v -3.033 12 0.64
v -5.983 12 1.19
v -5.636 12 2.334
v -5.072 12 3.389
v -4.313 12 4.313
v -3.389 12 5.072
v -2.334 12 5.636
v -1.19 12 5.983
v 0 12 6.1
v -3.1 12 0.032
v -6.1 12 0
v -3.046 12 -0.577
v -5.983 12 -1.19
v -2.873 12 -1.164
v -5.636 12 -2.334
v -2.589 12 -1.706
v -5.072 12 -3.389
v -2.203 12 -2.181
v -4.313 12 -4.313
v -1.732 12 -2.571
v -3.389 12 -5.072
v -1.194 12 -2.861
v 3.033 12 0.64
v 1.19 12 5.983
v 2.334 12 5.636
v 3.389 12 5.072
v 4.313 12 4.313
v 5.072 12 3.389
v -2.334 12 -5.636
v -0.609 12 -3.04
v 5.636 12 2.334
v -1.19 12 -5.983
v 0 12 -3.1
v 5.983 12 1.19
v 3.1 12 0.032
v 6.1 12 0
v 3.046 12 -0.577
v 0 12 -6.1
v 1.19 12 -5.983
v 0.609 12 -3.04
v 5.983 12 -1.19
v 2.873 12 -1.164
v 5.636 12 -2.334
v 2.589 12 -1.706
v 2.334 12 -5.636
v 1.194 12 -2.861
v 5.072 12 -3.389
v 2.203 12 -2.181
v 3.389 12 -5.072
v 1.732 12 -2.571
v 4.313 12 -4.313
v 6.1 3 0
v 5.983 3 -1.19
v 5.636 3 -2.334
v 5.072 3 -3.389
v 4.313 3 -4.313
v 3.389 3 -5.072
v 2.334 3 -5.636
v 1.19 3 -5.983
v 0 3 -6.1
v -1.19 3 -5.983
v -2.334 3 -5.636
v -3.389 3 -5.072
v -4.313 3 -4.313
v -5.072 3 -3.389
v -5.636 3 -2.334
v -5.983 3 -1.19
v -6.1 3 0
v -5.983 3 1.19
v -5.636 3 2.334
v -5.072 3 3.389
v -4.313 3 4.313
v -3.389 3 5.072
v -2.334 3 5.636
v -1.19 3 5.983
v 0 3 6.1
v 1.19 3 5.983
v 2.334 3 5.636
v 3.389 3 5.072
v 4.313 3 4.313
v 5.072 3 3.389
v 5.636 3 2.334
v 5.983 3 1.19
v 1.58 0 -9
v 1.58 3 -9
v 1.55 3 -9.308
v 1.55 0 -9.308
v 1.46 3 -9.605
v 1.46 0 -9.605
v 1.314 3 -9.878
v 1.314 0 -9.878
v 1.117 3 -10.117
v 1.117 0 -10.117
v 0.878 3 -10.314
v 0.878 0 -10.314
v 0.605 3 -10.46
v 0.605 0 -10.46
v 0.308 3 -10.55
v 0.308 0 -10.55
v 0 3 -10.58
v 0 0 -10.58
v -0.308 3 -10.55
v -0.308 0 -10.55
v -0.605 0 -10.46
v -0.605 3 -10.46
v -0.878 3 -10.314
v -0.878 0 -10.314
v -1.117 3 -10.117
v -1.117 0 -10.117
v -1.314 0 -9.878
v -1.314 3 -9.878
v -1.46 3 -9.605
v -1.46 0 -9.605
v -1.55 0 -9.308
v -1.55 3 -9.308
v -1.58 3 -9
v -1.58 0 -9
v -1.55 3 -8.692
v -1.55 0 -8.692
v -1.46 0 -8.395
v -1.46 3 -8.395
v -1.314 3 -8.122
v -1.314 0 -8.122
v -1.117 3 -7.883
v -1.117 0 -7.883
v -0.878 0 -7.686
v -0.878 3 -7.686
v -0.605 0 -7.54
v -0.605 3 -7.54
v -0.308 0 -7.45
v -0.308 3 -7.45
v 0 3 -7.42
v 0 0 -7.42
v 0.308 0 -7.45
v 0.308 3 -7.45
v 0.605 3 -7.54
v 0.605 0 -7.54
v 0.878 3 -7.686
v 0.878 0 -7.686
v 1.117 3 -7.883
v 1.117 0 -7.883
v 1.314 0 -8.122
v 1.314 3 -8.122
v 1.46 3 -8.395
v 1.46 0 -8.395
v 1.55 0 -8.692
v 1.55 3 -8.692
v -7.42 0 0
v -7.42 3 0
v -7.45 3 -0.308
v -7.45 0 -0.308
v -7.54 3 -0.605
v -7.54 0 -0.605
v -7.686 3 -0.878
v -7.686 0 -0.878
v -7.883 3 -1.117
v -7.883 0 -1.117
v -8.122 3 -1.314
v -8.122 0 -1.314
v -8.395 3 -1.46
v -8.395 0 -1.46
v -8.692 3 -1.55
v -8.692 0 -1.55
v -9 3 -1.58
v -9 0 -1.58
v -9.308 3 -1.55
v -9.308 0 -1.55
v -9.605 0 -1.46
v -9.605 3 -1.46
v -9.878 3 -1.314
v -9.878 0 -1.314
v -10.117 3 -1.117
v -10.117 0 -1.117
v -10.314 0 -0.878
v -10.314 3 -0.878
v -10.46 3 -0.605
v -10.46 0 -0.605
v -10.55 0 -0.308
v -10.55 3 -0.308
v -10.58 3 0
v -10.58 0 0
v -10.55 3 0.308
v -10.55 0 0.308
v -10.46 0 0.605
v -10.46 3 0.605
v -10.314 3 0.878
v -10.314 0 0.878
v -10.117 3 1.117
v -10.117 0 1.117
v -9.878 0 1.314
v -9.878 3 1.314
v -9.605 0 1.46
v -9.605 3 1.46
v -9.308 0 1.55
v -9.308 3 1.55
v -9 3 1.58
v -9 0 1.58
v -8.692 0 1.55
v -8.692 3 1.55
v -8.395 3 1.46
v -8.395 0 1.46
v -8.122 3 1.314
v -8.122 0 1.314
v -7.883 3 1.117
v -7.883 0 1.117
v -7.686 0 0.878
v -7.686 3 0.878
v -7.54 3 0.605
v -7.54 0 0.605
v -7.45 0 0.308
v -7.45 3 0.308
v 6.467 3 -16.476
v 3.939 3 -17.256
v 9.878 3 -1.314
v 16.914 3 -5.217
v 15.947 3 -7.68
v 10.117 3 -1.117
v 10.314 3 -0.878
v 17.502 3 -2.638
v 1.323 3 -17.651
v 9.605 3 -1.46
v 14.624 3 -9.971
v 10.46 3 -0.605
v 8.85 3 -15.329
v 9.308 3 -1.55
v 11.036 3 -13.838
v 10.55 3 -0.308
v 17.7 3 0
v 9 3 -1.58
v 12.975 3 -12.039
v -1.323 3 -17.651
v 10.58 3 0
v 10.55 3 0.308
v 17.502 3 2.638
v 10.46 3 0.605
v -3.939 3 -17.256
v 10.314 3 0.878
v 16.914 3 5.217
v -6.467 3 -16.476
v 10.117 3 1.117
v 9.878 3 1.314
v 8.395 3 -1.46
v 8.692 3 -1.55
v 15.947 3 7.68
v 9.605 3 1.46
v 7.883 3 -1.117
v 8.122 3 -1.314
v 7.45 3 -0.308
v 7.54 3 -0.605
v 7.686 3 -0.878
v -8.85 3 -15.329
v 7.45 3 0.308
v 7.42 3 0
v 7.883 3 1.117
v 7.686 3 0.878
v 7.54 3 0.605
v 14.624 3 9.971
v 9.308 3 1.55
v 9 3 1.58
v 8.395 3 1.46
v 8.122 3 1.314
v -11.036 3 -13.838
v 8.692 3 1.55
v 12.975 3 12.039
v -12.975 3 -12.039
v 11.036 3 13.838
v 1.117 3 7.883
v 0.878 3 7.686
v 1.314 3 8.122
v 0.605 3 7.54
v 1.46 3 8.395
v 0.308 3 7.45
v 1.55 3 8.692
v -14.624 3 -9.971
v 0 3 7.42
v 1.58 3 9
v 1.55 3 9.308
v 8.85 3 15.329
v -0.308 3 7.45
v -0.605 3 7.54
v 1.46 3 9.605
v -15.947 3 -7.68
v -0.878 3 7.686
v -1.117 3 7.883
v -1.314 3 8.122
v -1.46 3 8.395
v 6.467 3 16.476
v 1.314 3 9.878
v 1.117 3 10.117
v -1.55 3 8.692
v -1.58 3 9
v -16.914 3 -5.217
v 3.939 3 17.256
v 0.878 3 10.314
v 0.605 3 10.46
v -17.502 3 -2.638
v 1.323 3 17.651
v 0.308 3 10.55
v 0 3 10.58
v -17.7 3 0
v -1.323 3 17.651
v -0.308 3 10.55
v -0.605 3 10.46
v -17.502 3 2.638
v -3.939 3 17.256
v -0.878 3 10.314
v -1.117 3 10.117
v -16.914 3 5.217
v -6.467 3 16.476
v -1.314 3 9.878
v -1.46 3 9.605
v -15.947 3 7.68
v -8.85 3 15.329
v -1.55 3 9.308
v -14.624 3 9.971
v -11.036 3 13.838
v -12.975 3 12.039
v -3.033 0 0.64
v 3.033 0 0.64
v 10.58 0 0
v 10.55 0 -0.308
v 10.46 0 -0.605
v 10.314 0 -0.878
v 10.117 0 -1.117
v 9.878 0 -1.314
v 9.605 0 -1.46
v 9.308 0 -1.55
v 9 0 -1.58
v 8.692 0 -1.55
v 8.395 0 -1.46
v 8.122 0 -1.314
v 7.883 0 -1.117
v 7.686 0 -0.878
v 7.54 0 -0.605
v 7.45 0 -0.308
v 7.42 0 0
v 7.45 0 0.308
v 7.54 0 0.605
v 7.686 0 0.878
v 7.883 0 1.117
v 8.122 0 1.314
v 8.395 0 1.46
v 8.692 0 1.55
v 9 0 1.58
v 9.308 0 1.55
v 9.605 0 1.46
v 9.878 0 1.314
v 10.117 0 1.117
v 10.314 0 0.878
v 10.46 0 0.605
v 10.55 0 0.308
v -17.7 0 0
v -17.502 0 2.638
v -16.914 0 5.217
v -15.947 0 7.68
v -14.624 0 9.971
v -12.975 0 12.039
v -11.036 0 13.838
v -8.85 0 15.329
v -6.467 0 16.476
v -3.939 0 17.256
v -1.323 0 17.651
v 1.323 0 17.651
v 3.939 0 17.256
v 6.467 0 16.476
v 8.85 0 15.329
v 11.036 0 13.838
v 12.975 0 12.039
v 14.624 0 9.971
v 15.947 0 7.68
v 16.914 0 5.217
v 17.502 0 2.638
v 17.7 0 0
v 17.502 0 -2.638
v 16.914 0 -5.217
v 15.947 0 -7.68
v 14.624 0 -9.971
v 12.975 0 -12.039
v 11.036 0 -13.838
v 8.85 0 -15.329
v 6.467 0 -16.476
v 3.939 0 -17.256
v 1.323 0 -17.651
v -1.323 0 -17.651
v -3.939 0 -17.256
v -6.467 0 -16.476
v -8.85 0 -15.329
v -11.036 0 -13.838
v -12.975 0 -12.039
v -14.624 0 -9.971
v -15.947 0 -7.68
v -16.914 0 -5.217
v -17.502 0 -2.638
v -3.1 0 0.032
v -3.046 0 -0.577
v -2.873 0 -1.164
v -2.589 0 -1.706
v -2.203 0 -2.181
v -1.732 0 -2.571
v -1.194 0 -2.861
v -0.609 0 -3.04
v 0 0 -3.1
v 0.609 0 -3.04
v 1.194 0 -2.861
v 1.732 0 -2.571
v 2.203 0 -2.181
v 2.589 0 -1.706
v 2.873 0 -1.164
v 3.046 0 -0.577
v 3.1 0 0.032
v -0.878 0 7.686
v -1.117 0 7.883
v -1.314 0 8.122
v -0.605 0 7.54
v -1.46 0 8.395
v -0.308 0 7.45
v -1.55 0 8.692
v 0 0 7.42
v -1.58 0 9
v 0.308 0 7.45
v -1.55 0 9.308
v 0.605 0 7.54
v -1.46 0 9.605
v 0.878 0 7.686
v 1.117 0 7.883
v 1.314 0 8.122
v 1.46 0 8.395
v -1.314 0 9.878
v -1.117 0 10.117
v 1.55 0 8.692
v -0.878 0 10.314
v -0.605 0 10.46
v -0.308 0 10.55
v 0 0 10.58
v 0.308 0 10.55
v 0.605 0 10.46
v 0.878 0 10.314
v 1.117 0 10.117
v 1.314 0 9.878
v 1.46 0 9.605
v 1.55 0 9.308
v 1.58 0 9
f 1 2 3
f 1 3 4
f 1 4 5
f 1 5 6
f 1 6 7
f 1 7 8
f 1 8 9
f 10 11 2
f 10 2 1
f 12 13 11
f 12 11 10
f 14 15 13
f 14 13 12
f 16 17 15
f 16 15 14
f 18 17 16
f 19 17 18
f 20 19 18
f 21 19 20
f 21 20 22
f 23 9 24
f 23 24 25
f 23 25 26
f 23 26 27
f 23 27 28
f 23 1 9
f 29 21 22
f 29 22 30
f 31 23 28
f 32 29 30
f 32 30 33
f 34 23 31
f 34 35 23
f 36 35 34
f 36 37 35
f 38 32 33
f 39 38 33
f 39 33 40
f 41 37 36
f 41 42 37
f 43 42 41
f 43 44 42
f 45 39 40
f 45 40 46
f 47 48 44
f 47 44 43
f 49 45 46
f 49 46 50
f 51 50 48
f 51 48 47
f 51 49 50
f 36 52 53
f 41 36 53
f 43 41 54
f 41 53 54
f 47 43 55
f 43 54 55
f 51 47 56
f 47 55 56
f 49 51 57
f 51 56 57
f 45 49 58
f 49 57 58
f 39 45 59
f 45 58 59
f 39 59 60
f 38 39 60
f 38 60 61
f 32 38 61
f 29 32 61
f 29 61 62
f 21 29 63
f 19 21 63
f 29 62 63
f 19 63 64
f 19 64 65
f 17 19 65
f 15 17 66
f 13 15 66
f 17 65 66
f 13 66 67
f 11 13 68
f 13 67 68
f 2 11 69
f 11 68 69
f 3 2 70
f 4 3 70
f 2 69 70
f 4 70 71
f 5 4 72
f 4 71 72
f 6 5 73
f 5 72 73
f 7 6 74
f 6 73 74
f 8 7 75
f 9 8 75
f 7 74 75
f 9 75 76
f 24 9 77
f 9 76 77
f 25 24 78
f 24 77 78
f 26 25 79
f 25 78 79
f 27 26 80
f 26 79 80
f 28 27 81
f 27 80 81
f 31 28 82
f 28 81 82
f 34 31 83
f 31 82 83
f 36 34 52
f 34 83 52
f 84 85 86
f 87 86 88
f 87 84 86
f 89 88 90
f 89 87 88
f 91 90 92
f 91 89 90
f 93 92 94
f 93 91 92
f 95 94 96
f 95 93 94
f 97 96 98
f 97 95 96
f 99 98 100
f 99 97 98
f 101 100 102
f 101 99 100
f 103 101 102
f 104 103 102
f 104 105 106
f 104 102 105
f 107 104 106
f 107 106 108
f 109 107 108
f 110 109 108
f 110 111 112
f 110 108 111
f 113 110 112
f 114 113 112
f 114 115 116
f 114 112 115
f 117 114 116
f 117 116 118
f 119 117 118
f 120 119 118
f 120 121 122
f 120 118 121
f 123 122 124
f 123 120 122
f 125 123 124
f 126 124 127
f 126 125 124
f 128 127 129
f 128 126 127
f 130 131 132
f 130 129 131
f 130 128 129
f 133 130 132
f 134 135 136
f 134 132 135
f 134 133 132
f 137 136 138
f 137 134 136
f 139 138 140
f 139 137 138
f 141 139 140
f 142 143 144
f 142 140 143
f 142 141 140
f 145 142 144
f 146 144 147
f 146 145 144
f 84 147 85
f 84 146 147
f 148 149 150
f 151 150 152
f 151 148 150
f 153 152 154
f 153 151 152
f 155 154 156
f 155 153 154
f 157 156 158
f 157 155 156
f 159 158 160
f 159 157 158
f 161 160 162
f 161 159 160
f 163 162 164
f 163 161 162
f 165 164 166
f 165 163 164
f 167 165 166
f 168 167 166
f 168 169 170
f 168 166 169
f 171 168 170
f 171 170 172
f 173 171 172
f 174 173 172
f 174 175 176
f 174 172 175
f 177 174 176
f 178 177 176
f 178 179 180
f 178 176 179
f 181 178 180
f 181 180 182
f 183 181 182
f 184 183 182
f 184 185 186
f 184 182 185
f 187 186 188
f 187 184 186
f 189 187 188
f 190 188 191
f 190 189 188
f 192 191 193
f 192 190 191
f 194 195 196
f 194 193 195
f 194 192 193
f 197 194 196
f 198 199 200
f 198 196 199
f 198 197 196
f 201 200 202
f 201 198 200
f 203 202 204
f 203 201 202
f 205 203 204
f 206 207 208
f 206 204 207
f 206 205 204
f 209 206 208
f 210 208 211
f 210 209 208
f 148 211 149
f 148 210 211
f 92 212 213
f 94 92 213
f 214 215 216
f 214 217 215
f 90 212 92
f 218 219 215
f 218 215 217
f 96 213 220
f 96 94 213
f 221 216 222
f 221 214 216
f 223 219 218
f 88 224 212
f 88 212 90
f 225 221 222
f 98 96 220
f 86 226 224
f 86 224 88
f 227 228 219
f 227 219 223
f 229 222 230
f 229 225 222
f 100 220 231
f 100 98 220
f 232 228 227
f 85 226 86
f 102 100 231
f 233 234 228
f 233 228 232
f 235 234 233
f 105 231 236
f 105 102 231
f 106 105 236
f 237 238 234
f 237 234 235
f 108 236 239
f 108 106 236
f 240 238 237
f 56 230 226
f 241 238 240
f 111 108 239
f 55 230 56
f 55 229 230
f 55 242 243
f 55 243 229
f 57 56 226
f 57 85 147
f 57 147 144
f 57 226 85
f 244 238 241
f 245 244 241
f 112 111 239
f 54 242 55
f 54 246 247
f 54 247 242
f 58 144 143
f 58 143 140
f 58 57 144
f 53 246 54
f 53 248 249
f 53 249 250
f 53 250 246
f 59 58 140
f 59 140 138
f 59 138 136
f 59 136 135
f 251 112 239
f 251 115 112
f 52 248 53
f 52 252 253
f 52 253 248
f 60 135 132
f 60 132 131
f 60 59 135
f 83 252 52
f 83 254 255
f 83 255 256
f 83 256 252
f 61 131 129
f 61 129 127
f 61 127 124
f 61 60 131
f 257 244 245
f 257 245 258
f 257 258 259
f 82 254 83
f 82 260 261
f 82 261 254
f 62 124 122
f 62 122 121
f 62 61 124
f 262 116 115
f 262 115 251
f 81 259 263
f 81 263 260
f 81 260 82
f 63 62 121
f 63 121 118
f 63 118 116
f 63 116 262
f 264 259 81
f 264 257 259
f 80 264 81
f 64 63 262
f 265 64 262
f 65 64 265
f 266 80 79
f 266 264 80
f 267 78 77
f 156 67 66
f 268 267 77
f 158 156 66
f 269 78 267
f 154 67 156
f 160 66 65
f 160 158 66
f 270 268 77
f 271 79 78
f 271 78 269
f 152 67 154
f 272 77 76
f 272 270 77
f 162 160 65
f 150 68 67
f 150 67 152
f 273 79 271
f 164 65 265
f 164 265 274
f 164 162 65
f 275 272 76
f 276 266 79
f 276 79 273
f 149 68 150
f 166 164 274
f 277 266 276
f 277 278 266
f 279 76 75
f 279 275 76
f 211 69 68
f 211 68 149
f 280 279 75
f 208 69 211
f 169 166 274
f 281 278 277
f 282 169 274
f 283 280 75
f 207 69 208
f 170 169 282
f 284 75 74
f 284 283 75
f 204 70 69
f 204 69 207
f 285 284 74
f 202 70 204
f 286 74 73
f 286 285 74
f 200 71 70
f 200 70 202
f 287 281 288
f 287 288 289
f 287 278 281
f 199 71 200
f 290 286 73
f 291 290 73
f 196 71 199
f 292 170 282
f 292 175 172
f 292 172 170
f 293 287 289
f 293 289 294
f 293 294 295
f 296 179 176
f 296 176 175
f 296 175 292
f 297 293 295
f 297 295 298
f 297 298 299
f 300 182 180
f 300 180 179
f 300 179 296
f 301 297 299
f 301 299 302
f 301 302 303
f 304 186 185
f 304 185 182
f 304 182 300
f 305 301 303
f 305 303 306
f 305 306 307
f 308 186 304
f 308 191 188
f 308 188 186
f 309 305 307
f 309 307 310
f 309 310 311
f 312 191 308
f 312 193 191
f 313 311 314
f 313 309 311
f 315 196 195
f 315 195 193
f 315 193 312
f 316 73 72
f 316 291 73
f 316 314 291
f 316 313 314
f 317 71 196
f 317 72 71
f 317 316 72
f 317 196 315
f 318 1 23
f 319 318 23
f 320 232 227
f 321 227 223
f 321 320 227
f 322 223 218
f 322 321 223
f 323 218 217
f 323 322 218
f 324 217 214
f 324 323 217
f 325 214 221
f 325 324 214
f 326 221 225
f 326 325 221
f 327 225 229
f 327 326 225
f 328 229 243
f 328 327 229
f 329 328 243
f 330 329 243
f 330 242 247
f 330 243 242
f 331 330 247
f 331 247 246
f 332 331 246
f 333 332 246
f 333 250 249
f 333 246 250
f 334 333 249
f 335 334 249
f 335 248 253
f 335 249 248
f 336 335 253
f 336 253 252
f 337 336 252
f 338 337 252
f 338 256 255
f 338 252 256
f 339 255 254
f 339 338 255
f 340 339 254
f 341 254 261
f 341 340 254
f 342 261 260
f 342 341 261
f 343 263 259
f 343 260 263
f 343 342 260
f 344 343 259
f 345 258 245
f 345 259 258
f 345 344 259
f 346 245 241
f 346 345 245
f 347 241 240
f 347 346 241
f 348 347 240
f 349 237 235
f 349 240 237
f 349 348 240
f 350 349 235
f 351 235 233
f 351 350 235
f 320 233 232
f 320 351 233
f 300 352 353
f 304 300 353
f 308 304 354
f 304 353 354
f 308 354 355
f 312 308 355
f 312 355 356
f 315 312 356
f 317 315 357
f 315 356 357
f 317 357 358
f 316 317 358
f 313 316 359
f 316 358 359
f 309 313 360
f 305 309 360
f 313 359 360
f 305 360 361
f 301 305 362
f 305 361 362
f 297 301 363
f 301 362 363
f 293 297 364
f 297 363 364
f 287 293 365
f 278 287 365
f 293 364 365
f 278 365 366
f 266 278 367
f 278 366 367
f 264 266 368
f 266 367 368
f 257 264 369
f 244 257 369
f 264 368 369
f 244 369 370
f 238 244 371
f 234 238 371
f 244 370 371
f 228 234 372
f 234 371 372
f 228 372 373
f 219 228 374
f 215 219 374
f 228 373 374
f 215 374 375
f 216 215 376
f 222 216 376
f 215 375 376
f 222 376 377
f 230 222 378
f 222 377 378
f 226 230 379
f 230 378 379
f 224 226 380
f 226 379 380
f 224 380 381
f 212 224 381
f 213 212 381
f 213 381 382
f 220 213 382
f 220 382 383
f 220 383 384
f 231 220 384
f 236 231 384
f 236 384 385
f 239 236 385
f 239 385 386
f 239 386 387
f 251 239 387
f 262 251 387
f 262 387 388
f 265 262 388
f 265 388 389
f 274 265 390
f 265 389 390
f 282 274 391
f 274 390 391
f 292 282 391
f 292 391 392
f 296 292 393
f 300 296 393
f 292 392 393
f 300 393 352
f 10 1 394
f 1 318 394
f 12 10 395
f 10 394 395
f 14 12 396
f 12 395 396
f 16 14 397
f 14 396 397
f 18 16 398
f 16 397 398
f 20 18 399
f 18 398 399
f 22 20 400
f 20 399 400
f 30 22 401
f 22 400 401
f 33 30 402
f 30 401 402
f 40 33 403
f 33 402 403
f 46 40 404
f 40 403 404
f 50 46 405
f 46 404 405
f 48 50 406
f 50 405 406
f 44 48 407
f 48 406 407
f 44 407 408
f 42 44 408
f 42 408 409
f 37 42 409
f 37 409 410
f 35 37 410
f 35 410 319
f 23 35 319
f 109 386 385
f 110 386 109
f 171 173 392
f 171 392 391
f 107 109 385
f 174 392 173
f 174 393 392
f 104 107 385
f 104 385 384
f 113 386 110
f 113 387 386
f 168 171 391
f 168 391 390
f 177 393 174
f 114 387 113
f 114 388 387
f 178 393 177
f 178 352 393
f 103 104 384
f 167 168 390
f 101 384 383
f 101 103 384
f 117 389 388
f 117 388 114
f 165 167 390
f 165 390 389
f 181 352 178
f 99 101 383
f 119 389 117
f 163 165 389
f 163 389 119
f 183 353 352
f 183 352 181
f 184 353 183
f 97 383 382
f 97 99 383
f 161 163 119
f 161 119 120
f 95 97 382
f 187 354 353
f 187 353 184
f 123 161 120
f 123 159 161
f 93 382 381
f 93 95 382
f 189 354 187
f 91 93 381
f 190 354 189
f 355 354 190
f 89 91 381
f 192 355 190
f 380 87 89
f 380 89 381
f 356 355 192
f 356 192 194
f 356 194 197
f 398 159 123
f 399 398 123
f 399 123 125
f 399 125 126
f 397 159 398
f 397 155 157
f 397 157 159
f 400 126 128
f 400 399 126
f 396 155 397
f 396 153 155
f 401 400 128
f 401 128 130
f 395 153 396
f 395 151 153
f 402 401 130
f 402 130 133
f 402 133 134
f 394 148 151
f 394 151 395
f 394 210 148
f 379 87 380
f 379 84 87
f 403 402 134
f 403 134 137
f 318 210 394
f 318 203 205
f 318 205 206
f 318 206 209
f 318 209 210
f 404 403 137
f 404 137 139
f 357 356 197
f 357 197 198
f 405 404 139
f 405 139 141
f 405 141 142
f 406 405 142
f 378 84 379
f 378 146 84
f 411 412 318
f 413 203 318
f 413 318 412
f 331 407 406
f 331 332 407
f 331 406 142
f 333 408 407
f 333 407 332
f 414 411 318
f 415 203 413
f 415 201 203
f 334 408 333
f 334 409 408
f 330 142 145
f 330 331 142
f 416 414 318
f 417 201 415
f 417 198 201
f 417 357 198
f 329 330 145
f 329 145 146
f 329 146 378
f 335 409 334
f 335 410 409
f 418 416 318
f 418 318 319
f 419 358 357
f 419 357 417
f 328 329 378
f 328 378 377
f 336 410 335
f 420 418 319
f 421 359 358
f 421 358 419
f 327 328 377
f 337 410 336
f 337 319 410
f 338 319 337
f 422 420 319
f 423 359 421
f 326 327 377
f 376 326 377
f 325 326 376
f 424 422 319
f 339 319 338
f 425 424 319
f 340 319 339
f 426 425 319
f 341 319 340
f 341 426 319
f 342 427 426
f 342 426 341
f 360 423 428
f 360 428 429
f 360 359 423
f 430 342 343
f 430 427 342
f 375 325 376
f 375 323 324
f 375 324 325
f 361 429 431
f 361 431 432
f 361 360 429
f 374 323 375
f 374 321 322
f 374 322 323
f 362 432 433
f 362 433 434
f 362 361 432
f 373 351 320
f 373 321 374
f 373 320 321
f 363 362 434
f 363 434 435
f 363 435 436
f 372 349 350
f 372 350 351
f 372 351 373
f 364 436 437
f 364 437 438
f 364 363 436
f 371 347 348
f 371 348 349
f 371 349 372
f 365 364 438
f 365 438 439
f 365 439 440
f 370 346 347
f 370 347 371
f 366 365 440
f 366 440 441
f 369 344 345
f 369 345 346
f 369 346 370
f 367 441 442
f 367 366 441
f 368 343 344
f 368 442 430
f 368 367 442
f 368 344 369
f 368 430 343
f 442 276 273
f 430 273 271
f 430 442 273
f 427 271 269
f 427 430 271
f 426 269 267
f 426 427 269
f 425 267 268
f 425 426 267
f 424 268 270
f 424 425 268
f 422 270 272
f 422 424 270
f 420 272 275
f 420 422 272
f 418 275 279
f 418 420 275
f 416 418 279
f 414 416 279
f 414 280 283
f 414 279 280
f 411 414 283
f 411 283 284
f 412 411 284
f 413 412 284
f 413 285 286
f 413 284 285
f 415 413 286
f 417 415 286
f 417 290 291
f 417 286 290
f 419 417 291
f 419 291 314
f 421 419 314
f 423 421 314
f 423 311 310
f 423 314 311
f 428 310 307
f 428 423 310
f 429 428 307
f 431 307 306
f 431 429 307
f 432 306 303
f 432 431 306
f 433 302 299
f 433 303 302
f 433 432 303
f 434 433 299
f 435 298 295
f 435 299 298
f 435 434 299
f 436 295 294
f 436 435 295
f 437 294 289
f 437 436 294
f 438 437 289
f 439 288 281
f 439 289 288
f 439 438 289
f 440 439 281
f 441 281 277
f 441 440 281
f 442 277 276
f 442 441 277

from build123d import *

# Parameters (mm, degrees)
SKETCH2_R               = 17.7
BOSS_EXTRUDE3_DEPTH     = 3
SKETCH3_R               = 3.1
CUT_EXTRUDE3_DEPTH      = 4
CUT_EXTRUDE3_DEPTH_BACK = 1
SKETCH5_R               = 6.1
BOSS_EXTRUDE4_DEPTH     = 9
SKETCH4_R               = 1.58
CUT_EXTRUDE4_DEPTH      = 13
CUT_EXTRUDE4_DEPTH_BACK = 1
SKETCH6_R               = 3.1
CUT_EXTRUDE5_DEPTH      = 10
SKETCH7_W               = 6.2
SKETCH7_H               = 2.46
BOSS_EXTRUDE5_DEPTH     = 12


with BuildPart() as part:
    # Sketch2 → Boss-Extrude3 (new body)
    with BuildSketch(Plane(origin=(0, 0, 0), x_dir=(-1, 0, 0), z_dir=(0, 1, 0))):
        Circle(SKETCH2_R)
    extrude(amount=BOSS_EXTRUDE3_DEPTH)

    # Sketch3 → Cut-Extrude3 (cut, two sides)
    with BuildSketch(Plane(origin=(0, 0, 0), x_dir=(1, 0, 0), z_dir=(0, 1, 0))) as cut_extrude3_sk:
        Circle(SKETCH3_R)
    extrude(amount=CUT_EXTRUDE3_DEPTH, mode=Mode.SUBTRACT)
    extrude(cut_extrude3_sk.sketch, amount=-CUT_EXTRUDE3_DEPTH_BACK, mode=Mode.SUBTRACT)

    # Sketch5 → Boss-Extrude4 (add)
    with BuildSketch(Plane(origin=(0, 3, 0), x_dir=(1, 0, 0), z_dir=(0, 1, 0))):
        Circle(SKETCH5_R)
    extrude(amount=BOSS_EXTRUDE4_DEPTH)

    # Sketch4 → Cut-Extrude4 (cut, two sides)
    with BuildSketch(Plane(origin=(0, 0, 0), x_dir=(1, 0, 0), z_dir=(0, 1, 0))) as cut_extrude4_sk:
        with Locations((-9, 0)):
            Circle(SKETCH4_R)
        with Locations((9, 0)):
            Circle(SKETCH4_R)
        with Locations((0, 9)):
            Circle(SKETCH4_R)
        with Locations((0, -9)):
            Circle(SKETCH4_R)
    extrude(amount=CUT_EXTRUDE4_DEPTH, mode=Mode.SUBTRACT)
    extrude(cut_extrude4_sk.sketch, amount=-CUT_EXTRUDE4_DEPTH_BACK, mode=Mode.SUBTRACT)

    # Sketch6 → Cut-Extrude5 (cut)
    with BuildSketch(Plane.XZ.offset(-3)):
        Circle(SKETCH6_R)
    extrude(amount=-CUT_EXTRUDE5_DEPTH, mode=Mode.SUBTRACT)

    # Sketch7 → Boss-Extrude5 (add)
    with BuildSketch(Plane.XZ):
        with Locations((0, 1.87)):
            Rectangle(SKETCH7_W, SKETCH7_H)
    extrude(amount=-BOSS_EXTRUDE5_DEPTH)


solid = part.part
